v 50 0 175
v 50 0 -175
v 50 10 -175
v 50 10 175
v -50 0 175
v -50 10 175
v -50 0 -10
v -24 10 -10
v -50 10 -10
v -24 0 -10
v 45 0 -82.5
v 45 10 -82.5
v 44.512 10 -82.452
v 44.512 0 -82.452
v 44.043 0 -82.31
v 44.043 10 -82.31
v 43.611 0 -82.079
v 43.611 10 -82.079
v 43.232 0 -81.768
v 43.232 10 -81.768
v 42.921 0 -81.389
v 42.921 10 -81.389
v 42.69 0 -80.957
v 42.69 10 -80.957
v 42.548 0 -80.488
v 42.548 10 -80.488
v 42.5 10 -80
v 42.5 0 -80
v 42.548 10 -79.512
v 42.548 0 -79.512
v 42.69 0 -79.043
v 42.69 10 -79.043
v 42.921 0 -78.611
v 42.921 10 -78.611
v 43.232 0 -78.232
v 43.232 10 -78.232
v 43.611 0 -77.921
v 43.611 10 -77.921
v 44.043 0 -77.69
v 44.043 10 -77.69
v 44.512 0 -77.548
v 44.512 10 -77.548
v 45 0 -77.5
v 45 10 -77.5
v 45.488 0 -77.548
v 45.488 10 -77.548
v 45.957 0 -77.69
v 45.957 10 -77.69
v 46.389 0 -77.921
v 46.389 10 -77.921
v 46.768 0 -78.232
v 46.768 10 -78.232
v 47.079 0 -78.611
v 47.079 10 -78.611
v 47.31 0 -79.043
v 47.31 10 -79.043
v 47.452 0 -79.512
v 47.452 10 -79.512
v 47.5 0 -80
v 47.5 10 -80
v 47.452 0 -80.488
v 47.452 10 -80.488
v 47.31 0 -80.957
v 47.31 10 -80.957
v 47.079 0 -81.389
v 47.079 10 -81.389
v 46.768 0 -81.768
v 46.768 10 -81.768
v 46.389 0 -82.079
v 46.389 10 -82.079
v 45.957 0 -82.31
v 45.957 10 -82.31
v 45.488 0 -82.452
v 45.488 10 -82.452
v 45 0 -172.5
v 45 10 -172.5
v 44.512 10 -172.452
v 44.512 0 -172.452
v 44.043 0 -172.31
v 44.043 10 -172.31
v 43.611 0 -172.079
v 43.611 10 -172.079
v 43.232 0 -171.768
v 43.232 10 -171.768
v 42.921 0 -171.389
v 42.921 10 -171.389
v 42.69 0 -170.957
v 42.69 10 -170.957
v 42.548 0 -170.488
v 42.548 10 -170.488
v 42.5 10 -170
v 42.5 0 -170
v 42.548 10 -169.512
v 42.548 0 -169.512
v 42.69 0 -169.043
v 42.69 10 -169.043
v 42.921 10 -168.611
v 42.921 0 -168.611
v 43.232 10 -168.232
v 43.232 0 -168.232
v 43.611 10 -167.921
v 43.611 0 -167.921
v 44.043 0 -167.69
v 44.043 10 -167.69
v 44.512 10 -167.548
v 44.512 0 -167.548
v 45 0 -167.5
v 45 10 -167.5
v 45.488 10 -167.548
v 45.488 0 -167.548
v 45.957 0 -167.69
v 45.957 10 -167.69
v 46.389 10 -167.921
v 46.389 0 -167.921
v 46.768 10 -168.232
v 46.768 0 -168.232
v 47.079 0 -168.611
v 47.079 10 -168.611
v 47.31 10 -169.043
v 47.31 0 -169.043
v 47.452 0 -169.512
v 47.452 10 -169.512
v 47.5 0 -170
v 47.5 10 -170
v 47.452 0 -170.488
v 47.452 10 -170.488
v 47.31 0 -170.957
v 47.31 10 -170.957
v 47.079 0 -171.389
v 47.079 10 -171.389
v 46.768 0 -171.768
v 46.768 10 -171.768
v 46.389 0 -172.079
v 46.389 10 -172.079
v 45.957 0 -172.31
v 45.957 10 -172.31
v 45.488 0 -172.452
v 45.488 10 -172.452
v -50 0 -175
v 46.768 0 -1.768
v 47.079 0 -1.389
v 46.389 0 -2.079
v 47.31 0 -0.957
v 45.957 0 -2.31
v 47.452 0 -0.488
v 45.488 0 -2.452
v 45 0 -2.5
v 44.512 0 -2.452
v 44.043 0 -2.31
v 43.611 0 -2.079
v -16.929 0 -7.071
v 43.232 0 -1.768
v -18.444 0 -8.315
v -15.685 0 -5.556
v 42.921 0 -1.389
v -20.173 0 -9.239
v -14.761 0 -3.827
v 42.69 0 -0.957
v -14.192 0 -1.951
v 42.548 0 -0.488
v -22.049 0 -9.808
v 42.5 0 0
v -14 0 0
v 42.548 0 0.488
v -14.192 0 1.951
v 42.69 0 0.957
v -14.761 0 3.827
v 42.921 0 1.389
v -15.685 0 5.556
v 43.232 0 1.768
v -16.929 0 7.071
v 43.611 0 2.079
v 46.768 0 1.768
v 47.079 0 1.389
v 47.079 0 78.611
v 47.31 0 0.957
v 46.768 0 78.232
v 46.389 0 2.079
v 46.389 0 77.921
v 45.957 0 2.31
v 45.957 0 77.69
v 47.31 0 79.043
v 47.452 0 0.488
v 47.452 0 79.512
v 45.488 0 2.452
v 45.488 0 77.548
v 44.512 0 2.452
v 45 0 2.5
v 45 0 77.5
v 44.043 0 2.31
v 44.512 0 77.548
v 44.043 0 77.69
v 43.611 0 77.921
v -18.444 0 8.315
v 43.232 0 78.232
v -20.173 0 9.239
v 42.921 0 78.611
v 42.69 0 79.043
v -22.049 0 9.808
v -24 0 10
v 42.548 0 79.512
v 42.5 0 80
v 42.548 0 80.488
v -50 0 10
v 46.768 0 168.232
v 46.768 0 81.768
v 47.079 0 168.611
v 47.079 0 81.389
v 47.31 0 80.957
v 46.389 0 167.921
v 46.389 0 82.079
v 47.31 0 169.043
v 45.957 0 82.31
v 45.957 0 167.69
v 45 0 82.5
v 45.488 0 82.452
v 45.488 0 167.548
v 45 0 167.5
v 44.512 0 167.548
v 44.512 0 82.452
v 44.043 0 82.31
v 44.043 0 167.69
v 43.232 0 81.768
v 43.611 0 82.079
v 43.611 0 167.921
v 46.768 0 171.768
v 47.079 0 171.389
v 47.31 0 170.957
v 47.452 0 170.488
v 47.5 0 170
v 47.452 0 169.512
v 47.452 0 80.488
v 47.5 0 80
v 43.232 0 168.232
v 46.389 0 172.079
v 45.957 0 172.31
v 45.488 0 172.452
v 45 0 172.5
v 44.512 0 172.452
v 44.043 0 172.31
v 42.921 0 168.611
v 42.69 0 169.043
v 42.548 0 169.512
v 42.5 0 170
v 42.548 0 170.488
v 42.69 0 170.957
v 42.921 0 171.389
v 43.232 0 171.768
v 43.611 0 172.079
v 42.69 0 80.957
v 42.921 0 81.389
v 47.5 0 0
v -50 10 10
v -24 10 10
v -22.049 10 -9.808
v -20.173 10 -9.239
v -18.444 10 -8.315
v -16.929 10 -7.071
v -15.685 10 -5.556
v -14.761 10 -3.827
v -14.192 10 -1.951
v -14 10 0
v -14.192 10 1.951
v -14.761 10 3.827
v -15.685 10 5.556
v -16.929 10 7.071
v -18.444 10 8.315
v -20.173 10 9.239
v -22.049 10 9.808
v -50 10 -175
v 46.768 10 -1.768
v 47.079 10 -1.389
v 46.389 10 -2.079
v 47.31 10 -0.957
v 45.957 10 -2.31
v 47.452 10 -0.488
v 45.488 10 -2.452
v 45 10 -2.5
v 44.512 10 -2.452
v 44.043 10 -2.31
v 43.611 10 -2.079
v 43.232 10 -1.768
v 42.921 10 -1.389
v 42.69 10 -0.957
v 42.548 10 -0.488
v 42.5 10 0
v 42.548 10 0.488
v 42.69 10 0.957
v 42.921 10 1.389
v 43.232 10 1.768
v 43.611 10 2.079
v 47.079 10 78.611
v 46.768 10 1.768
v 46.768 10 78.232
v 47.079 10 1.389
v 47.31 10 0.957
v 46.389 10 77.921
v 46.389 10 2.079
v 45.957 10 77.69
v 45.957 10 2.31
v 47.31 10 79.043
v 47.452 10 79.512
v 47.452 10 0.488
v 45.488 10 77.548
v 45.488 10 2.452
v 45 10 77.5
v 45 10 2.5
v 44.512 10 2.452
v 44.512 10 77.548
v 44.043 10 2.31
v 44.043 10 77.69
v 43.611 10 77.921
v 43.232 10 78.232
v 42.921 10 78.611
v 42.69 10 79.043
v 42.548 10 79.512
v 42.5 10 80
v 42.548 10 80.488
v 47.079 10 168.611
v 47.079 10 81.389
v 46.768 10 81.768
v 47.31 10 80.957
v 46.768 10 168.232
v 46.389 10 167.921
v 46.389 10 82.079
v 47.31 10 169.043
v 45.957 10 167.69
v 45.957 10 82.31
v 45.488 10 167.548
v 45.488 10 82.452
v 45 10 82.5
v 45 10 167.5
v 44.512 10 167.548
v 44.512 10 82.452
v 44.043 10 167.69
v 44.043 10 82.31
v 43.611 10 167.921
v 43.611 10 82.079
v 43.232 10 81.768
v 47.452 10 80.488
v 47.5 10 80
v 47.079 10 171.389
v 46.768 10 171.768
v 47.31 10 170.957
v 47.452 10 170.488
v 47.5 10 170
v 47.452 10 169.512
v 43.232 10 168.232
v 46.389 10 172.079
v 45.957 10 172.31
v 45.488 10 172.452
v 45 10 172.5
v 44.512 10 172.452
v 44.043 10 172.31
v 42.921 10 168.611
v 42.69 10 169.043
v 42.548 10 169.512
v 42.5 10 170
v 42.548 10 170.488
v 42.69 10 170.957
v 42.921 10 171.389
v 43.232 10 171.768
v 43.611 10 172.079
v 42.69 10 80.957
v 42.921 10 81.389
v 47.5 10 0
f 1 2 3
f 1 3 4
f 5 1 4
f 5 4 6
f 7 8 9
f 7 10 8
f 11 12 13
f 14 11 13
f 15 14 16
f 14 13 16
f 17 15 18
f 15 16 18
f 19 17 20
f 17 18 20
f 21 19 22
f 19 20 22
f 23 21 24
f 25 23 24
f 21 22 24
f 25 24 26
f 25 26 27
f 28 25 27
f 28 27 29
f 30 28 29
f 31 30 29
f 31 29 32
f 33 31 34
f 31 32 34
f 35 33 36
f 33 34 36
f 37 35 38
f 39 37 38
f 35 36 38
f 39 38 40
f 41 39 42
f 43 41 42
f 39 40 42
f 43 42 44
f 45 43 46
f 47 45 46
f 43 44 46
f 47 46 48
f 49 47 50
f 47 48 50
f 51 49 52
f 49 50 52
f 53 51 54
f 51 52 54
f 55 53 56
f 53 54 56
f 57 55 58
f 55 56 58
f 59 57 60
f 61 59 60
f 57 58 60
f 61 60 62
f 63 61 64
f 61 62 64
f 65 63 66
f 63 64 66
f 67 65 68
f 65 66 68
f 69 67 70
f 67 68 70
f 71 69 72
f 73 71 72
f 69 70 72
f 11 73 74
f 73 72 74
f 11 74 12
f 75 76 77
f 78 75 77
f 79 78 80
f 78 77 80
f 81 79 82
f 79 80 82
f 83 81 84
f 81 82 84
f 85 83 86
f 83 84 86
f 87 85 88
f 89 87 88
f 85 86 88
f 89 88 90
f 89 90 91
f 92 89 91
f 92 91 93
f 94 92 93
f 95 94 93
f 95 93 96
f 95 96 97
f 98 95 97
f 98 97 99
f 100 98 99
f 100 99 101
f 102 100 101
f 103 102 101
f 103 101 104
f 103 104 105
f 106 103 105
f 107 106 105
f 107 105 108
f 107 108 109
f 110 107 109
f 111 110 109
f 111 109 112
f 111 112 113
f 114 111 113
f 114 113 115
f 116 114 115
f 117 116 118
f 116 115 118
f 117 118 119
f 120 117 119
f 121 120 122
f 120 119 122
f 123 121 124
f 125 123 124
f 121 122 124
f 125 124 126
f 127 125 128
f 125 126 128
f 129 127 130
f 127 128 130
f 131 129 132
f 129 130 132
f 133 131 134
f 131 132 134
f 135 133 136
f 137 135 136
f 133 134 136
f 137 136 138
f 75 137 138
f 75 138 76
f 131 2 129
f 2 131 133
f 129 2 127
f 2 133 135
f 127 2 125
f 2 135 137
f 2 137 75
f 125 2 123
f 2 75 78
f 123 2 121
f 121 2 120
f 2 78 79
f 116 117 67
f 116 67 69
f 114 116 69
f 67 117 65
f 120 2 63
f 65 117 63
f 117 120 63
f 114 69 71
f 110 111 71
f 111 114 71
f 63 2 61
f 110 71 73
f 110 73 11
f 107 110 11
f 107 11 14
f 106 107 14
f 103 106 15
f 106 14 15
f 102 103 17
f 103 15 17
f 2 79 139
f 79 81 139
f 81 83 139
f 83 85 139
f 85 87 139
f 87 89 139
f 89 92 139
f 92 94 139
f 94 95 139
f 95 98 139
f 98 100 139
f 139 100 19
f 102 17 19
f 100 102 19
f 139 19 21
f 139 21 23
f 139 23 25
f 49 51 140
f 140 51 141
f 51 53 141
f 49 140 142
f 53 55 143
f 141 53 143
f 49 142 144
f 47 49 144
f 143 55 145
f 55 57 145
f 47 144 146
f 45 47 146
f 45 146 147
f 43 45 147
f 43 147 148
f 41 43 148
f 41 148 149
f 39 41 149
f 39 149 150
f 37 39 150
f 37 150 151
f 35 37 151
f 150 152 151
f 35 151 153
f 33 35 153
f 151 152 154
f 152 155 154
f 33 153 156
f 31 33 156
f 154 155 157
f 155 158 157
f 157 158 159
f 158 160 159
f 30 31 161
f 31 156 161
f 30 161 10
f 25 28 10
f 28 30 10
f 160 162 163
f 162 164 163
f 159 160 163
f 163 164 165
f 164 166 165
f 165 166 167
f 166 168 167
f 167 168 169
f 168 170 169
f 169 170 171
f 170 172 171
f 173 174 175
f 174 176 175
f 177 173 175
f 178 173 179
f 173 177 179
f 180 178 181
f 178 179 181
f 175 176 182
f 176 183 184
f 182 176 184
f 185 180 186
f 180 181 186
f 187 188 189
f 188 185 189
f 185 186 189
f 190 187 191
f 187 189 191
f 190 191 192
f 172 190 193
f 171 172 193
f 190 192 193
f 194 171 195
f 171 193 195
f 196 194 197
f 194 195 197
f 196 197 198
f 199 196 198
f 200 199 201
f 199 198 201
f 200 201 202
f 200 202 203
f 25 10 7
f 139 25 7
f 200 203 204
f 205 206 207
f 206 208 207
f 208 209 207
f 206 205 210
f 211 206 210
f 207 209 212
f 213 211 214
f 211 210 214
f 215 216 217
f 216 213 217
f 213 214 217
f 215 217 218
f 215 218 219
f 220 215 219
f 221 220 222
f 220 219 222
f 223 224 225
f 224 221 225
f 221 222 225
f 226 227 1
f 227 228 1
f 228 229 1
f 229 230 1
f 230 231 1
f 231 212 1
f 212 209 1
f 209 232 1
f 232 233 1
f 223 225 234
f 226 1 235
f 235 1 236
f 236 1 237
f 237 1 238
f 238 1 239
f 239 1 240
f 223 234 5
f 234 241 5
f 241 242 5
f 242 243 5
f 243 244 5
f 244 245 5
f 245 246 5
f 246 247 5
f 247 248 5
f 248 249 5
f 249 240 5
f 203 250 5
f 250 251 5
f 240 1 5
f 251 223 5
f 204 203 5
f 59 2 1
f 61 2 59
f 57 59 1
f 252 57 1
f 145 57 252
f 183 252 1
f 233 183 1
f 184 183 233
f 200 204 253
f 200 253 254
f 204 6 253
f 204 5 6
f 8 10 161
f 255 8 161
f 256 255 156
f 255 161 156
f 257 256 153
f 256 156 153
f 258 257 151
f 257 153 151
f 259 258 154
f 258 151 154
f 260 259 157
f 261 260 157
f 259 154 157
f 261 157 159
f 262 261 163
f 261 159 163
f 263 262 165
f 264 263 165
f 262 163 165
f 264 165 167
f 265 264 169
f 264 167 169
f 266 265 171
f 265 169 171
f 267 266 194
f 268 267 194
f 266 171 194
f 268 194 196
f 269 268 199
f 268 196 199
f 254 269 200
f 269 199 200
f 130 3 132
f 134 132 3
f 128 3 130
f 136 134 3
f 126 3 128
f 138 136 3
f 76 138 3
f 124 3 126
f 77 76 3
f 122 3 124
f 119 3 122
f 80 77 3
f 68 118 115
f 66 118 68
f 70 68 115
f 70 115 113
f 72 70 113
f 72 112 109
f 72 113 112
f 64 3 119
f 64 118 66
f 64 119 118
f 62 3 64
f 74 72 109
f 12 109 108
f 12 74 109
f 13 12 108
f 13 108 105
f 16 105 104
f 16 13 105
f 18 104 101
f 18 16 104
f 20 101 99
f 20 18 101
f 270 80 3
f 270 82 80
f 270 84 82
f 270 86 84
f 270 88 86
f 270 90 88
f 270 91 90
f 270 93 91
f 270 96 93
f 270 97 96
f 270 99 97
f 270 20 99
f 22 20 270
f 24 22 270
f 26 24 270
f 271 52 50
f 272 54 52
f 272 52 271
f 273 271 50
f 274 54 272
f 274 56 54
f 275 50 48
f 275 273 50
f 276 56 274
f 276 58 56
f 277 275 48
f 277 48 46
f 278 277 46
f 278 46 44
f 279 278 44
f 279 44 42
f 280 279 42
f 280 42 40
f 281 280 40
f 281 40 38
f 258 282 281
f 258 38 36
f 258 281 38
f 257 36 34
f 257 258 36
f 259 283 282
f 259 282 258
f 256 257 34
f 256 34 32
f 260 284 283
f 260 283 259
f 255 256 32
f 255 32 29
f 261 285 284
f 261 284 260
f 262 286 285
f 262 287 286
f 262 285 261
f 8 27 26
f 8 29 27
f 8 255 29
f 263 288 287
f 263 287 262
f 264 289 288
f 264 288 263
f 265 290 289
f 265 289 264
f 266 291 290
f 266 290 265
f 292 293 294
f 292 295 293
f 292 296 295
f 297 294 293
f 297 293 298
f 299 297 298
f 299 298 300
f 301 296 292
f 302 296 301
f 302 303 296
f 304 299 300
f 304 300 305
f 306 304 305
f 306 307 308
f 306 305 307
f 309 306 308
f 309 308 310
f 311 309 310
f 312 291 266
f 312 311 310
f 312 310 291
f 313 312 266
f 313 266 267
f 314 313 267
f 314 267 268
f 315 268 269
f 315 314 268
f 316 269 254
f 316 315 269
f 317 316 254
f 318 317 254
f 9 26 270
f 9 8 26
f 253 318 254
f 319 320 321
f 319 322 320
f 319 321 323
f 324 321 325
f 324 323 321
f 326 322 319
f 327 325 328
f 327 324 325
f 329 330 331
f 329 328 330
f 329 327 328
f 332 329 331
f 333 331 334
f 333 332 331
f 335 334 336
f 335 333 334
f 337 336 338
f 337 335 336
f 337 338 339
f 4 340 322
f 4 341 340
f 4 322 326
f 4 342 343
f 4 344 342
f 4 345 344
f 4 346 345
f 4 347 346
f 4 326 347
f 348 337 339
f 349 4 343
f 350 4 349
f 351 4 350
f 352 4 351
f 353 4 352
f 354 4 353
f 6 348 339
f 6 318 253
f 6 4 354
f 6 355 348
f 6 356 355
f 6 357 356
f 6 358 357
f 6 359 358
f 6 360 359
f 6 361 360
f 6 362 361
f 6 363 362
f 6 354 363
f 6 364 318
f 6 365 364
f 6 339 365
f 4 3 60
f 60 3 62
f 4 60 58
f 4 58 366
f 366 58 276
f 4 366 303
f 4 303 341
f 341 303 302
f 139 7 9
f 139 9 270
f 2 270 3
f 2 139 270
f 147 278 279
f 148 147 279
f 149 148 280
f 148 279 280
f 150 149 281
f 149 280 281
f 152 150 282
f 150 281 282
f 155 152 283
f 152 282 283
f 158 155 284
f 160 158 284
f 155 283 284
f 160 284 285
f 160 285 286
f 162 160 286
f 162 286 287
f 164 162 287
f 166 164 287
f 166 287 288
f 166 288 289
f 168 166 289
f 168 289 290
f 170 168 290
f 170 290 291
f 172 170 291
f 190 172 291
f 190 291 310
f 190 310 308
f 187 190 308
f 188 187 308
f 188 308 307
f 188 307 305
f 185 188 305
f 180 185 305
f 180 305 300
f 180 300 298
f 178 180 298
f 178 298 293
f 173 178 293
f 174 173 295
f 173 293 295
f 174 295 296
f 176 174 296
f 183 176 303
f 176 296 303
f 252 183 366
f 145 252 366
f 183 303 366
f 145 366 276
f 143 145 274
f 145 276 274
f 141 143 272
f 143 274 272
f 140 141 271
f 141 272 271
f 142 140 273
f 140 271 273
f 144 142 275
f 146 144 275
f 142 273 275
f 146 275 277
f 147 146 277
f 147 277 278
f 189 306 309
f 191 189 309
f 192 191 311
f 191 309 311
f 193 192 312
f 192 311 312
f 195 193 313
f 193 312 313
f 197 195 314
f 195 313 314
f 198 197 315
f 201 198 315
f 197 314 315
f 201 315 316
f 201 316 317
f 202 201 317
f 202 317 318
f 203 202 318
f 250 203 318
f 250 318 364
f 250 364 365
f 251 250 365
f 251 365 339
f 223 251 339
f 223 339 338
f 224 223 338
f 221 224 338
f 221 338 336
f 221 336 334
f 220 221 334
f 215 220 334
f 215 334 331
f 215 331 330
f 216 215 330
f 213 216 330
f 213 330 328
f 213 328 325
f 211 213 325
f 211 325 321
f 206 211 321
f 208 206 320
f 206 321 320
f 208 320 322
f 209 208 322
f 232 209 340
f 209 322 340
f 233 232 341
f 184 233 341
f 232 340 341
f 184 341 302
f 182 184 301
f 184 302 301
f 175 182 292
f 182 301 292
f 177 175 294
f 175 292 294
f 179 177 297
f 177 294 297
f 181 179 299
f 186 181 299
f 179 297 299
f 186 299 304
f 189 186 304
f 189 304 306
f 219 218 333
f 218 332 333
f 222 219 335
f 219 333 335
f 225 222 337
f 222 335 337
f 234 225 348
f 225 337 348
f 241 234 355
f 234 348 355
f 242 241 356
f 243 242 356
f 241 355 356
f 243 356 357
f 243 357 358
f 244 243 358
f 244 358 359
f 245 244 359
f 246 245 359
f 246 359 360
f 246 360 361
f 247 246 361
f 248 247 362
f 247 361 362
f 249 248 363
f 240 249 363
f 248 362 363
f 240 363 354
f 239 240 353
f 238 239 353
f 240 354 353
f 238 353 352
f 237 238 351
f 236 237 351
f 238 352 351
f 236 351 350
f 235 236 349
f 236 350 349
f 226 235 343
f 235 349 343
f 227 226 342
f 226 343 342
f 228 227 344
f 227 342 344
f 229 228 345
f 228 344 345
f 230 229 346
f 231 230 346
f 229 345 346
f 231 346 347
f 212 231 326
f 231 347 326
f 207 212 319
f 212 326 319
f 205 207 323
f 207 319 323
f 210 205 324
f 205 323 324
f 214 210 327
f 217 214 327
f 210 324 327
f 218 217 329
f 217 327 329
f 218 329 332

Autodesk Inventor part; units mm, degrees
ref_plane "YZ Plane" through (0, 0, 0) normal (1, 0, 0) x (0, 1, 0)
ref_plane "XZ Plane" through (0, 0, 0) normal (0, 1, 0) x (-1, 0, 0)
ref_plane "XY Plane" through (0, 0, 0) normal (0, 0, 1) x (1, 0, 0)
sketch "Sketch1" plane through (0, 0, 0) normal (0, 1, 0) x (-1, 0, 0)
  line L0 (-50, 175) -> (50, 175)
  line L1 (50, 175) -> (50, -175)
  line L2 (50, -175) -> (-50, -175)
  line L3 (-50, -175) -> (-50, 175)
  line L4 (-50, 175) -> (50, -175) construction
  line L5 (50, 175) -> (-50, -175) construction
  point P0 (0, 0)
  dimension "d0" = 350
  dimension "d1" = 100
extrude "Extrusion1" add sketch "Sketch1" along normal blind 10
sketch "Sketch2" plane through (0, 0, 0) normal (0, -1, 0) x (1, 0, 0)
  circle A0 centre (-24, 0) radius 5 projected
  circle A1 centre (-24, 0) radius 10
  line L0 (-24, 10) -> (-24, -10)
  line L1 (-24, -10) -> (-50, -10)
  line L2 (-50, -10) -> (-50, 10)
  line L3 (-50, 10) -> (-24, 10)
  line L4 (-50, 175) -> (-50, -175) projected
  point P0 (0, 0)
  dimension "d4" = 20
extrude "Extrusion2" cut sketch "Sketch2" against normal blind 10
sketch "Sketch3" plane through (0, 0, 0) normal (0, -1, 0) x (1, 0, 0)
  line L0 (50, 175) -> (50, -175) projected
  line L1 (45, 150) -> (45, -150)
  line L2 (0, 0) -> (31.7101, 0) construction
  line L3 (-50, 175) -> (50, 175) projected
  point P0 (45, 0)
  point P1 (45, 170)
  point P2 (45, 80)
  point P3 (45, -80)
  point P4 (45, -170)
  dimension "d7" = 5
  dimension "d8" = 5
  dimension "d9" = 80
hole "Hole1" at (45, 0, 0) at (45, 0, 170) at (45, 0, 80) at (45, 0, -80) at (45, 0, -170) direction (0, 1, 0) diameter 5 end through all
properties part number "08_Tam_canh_hong"
